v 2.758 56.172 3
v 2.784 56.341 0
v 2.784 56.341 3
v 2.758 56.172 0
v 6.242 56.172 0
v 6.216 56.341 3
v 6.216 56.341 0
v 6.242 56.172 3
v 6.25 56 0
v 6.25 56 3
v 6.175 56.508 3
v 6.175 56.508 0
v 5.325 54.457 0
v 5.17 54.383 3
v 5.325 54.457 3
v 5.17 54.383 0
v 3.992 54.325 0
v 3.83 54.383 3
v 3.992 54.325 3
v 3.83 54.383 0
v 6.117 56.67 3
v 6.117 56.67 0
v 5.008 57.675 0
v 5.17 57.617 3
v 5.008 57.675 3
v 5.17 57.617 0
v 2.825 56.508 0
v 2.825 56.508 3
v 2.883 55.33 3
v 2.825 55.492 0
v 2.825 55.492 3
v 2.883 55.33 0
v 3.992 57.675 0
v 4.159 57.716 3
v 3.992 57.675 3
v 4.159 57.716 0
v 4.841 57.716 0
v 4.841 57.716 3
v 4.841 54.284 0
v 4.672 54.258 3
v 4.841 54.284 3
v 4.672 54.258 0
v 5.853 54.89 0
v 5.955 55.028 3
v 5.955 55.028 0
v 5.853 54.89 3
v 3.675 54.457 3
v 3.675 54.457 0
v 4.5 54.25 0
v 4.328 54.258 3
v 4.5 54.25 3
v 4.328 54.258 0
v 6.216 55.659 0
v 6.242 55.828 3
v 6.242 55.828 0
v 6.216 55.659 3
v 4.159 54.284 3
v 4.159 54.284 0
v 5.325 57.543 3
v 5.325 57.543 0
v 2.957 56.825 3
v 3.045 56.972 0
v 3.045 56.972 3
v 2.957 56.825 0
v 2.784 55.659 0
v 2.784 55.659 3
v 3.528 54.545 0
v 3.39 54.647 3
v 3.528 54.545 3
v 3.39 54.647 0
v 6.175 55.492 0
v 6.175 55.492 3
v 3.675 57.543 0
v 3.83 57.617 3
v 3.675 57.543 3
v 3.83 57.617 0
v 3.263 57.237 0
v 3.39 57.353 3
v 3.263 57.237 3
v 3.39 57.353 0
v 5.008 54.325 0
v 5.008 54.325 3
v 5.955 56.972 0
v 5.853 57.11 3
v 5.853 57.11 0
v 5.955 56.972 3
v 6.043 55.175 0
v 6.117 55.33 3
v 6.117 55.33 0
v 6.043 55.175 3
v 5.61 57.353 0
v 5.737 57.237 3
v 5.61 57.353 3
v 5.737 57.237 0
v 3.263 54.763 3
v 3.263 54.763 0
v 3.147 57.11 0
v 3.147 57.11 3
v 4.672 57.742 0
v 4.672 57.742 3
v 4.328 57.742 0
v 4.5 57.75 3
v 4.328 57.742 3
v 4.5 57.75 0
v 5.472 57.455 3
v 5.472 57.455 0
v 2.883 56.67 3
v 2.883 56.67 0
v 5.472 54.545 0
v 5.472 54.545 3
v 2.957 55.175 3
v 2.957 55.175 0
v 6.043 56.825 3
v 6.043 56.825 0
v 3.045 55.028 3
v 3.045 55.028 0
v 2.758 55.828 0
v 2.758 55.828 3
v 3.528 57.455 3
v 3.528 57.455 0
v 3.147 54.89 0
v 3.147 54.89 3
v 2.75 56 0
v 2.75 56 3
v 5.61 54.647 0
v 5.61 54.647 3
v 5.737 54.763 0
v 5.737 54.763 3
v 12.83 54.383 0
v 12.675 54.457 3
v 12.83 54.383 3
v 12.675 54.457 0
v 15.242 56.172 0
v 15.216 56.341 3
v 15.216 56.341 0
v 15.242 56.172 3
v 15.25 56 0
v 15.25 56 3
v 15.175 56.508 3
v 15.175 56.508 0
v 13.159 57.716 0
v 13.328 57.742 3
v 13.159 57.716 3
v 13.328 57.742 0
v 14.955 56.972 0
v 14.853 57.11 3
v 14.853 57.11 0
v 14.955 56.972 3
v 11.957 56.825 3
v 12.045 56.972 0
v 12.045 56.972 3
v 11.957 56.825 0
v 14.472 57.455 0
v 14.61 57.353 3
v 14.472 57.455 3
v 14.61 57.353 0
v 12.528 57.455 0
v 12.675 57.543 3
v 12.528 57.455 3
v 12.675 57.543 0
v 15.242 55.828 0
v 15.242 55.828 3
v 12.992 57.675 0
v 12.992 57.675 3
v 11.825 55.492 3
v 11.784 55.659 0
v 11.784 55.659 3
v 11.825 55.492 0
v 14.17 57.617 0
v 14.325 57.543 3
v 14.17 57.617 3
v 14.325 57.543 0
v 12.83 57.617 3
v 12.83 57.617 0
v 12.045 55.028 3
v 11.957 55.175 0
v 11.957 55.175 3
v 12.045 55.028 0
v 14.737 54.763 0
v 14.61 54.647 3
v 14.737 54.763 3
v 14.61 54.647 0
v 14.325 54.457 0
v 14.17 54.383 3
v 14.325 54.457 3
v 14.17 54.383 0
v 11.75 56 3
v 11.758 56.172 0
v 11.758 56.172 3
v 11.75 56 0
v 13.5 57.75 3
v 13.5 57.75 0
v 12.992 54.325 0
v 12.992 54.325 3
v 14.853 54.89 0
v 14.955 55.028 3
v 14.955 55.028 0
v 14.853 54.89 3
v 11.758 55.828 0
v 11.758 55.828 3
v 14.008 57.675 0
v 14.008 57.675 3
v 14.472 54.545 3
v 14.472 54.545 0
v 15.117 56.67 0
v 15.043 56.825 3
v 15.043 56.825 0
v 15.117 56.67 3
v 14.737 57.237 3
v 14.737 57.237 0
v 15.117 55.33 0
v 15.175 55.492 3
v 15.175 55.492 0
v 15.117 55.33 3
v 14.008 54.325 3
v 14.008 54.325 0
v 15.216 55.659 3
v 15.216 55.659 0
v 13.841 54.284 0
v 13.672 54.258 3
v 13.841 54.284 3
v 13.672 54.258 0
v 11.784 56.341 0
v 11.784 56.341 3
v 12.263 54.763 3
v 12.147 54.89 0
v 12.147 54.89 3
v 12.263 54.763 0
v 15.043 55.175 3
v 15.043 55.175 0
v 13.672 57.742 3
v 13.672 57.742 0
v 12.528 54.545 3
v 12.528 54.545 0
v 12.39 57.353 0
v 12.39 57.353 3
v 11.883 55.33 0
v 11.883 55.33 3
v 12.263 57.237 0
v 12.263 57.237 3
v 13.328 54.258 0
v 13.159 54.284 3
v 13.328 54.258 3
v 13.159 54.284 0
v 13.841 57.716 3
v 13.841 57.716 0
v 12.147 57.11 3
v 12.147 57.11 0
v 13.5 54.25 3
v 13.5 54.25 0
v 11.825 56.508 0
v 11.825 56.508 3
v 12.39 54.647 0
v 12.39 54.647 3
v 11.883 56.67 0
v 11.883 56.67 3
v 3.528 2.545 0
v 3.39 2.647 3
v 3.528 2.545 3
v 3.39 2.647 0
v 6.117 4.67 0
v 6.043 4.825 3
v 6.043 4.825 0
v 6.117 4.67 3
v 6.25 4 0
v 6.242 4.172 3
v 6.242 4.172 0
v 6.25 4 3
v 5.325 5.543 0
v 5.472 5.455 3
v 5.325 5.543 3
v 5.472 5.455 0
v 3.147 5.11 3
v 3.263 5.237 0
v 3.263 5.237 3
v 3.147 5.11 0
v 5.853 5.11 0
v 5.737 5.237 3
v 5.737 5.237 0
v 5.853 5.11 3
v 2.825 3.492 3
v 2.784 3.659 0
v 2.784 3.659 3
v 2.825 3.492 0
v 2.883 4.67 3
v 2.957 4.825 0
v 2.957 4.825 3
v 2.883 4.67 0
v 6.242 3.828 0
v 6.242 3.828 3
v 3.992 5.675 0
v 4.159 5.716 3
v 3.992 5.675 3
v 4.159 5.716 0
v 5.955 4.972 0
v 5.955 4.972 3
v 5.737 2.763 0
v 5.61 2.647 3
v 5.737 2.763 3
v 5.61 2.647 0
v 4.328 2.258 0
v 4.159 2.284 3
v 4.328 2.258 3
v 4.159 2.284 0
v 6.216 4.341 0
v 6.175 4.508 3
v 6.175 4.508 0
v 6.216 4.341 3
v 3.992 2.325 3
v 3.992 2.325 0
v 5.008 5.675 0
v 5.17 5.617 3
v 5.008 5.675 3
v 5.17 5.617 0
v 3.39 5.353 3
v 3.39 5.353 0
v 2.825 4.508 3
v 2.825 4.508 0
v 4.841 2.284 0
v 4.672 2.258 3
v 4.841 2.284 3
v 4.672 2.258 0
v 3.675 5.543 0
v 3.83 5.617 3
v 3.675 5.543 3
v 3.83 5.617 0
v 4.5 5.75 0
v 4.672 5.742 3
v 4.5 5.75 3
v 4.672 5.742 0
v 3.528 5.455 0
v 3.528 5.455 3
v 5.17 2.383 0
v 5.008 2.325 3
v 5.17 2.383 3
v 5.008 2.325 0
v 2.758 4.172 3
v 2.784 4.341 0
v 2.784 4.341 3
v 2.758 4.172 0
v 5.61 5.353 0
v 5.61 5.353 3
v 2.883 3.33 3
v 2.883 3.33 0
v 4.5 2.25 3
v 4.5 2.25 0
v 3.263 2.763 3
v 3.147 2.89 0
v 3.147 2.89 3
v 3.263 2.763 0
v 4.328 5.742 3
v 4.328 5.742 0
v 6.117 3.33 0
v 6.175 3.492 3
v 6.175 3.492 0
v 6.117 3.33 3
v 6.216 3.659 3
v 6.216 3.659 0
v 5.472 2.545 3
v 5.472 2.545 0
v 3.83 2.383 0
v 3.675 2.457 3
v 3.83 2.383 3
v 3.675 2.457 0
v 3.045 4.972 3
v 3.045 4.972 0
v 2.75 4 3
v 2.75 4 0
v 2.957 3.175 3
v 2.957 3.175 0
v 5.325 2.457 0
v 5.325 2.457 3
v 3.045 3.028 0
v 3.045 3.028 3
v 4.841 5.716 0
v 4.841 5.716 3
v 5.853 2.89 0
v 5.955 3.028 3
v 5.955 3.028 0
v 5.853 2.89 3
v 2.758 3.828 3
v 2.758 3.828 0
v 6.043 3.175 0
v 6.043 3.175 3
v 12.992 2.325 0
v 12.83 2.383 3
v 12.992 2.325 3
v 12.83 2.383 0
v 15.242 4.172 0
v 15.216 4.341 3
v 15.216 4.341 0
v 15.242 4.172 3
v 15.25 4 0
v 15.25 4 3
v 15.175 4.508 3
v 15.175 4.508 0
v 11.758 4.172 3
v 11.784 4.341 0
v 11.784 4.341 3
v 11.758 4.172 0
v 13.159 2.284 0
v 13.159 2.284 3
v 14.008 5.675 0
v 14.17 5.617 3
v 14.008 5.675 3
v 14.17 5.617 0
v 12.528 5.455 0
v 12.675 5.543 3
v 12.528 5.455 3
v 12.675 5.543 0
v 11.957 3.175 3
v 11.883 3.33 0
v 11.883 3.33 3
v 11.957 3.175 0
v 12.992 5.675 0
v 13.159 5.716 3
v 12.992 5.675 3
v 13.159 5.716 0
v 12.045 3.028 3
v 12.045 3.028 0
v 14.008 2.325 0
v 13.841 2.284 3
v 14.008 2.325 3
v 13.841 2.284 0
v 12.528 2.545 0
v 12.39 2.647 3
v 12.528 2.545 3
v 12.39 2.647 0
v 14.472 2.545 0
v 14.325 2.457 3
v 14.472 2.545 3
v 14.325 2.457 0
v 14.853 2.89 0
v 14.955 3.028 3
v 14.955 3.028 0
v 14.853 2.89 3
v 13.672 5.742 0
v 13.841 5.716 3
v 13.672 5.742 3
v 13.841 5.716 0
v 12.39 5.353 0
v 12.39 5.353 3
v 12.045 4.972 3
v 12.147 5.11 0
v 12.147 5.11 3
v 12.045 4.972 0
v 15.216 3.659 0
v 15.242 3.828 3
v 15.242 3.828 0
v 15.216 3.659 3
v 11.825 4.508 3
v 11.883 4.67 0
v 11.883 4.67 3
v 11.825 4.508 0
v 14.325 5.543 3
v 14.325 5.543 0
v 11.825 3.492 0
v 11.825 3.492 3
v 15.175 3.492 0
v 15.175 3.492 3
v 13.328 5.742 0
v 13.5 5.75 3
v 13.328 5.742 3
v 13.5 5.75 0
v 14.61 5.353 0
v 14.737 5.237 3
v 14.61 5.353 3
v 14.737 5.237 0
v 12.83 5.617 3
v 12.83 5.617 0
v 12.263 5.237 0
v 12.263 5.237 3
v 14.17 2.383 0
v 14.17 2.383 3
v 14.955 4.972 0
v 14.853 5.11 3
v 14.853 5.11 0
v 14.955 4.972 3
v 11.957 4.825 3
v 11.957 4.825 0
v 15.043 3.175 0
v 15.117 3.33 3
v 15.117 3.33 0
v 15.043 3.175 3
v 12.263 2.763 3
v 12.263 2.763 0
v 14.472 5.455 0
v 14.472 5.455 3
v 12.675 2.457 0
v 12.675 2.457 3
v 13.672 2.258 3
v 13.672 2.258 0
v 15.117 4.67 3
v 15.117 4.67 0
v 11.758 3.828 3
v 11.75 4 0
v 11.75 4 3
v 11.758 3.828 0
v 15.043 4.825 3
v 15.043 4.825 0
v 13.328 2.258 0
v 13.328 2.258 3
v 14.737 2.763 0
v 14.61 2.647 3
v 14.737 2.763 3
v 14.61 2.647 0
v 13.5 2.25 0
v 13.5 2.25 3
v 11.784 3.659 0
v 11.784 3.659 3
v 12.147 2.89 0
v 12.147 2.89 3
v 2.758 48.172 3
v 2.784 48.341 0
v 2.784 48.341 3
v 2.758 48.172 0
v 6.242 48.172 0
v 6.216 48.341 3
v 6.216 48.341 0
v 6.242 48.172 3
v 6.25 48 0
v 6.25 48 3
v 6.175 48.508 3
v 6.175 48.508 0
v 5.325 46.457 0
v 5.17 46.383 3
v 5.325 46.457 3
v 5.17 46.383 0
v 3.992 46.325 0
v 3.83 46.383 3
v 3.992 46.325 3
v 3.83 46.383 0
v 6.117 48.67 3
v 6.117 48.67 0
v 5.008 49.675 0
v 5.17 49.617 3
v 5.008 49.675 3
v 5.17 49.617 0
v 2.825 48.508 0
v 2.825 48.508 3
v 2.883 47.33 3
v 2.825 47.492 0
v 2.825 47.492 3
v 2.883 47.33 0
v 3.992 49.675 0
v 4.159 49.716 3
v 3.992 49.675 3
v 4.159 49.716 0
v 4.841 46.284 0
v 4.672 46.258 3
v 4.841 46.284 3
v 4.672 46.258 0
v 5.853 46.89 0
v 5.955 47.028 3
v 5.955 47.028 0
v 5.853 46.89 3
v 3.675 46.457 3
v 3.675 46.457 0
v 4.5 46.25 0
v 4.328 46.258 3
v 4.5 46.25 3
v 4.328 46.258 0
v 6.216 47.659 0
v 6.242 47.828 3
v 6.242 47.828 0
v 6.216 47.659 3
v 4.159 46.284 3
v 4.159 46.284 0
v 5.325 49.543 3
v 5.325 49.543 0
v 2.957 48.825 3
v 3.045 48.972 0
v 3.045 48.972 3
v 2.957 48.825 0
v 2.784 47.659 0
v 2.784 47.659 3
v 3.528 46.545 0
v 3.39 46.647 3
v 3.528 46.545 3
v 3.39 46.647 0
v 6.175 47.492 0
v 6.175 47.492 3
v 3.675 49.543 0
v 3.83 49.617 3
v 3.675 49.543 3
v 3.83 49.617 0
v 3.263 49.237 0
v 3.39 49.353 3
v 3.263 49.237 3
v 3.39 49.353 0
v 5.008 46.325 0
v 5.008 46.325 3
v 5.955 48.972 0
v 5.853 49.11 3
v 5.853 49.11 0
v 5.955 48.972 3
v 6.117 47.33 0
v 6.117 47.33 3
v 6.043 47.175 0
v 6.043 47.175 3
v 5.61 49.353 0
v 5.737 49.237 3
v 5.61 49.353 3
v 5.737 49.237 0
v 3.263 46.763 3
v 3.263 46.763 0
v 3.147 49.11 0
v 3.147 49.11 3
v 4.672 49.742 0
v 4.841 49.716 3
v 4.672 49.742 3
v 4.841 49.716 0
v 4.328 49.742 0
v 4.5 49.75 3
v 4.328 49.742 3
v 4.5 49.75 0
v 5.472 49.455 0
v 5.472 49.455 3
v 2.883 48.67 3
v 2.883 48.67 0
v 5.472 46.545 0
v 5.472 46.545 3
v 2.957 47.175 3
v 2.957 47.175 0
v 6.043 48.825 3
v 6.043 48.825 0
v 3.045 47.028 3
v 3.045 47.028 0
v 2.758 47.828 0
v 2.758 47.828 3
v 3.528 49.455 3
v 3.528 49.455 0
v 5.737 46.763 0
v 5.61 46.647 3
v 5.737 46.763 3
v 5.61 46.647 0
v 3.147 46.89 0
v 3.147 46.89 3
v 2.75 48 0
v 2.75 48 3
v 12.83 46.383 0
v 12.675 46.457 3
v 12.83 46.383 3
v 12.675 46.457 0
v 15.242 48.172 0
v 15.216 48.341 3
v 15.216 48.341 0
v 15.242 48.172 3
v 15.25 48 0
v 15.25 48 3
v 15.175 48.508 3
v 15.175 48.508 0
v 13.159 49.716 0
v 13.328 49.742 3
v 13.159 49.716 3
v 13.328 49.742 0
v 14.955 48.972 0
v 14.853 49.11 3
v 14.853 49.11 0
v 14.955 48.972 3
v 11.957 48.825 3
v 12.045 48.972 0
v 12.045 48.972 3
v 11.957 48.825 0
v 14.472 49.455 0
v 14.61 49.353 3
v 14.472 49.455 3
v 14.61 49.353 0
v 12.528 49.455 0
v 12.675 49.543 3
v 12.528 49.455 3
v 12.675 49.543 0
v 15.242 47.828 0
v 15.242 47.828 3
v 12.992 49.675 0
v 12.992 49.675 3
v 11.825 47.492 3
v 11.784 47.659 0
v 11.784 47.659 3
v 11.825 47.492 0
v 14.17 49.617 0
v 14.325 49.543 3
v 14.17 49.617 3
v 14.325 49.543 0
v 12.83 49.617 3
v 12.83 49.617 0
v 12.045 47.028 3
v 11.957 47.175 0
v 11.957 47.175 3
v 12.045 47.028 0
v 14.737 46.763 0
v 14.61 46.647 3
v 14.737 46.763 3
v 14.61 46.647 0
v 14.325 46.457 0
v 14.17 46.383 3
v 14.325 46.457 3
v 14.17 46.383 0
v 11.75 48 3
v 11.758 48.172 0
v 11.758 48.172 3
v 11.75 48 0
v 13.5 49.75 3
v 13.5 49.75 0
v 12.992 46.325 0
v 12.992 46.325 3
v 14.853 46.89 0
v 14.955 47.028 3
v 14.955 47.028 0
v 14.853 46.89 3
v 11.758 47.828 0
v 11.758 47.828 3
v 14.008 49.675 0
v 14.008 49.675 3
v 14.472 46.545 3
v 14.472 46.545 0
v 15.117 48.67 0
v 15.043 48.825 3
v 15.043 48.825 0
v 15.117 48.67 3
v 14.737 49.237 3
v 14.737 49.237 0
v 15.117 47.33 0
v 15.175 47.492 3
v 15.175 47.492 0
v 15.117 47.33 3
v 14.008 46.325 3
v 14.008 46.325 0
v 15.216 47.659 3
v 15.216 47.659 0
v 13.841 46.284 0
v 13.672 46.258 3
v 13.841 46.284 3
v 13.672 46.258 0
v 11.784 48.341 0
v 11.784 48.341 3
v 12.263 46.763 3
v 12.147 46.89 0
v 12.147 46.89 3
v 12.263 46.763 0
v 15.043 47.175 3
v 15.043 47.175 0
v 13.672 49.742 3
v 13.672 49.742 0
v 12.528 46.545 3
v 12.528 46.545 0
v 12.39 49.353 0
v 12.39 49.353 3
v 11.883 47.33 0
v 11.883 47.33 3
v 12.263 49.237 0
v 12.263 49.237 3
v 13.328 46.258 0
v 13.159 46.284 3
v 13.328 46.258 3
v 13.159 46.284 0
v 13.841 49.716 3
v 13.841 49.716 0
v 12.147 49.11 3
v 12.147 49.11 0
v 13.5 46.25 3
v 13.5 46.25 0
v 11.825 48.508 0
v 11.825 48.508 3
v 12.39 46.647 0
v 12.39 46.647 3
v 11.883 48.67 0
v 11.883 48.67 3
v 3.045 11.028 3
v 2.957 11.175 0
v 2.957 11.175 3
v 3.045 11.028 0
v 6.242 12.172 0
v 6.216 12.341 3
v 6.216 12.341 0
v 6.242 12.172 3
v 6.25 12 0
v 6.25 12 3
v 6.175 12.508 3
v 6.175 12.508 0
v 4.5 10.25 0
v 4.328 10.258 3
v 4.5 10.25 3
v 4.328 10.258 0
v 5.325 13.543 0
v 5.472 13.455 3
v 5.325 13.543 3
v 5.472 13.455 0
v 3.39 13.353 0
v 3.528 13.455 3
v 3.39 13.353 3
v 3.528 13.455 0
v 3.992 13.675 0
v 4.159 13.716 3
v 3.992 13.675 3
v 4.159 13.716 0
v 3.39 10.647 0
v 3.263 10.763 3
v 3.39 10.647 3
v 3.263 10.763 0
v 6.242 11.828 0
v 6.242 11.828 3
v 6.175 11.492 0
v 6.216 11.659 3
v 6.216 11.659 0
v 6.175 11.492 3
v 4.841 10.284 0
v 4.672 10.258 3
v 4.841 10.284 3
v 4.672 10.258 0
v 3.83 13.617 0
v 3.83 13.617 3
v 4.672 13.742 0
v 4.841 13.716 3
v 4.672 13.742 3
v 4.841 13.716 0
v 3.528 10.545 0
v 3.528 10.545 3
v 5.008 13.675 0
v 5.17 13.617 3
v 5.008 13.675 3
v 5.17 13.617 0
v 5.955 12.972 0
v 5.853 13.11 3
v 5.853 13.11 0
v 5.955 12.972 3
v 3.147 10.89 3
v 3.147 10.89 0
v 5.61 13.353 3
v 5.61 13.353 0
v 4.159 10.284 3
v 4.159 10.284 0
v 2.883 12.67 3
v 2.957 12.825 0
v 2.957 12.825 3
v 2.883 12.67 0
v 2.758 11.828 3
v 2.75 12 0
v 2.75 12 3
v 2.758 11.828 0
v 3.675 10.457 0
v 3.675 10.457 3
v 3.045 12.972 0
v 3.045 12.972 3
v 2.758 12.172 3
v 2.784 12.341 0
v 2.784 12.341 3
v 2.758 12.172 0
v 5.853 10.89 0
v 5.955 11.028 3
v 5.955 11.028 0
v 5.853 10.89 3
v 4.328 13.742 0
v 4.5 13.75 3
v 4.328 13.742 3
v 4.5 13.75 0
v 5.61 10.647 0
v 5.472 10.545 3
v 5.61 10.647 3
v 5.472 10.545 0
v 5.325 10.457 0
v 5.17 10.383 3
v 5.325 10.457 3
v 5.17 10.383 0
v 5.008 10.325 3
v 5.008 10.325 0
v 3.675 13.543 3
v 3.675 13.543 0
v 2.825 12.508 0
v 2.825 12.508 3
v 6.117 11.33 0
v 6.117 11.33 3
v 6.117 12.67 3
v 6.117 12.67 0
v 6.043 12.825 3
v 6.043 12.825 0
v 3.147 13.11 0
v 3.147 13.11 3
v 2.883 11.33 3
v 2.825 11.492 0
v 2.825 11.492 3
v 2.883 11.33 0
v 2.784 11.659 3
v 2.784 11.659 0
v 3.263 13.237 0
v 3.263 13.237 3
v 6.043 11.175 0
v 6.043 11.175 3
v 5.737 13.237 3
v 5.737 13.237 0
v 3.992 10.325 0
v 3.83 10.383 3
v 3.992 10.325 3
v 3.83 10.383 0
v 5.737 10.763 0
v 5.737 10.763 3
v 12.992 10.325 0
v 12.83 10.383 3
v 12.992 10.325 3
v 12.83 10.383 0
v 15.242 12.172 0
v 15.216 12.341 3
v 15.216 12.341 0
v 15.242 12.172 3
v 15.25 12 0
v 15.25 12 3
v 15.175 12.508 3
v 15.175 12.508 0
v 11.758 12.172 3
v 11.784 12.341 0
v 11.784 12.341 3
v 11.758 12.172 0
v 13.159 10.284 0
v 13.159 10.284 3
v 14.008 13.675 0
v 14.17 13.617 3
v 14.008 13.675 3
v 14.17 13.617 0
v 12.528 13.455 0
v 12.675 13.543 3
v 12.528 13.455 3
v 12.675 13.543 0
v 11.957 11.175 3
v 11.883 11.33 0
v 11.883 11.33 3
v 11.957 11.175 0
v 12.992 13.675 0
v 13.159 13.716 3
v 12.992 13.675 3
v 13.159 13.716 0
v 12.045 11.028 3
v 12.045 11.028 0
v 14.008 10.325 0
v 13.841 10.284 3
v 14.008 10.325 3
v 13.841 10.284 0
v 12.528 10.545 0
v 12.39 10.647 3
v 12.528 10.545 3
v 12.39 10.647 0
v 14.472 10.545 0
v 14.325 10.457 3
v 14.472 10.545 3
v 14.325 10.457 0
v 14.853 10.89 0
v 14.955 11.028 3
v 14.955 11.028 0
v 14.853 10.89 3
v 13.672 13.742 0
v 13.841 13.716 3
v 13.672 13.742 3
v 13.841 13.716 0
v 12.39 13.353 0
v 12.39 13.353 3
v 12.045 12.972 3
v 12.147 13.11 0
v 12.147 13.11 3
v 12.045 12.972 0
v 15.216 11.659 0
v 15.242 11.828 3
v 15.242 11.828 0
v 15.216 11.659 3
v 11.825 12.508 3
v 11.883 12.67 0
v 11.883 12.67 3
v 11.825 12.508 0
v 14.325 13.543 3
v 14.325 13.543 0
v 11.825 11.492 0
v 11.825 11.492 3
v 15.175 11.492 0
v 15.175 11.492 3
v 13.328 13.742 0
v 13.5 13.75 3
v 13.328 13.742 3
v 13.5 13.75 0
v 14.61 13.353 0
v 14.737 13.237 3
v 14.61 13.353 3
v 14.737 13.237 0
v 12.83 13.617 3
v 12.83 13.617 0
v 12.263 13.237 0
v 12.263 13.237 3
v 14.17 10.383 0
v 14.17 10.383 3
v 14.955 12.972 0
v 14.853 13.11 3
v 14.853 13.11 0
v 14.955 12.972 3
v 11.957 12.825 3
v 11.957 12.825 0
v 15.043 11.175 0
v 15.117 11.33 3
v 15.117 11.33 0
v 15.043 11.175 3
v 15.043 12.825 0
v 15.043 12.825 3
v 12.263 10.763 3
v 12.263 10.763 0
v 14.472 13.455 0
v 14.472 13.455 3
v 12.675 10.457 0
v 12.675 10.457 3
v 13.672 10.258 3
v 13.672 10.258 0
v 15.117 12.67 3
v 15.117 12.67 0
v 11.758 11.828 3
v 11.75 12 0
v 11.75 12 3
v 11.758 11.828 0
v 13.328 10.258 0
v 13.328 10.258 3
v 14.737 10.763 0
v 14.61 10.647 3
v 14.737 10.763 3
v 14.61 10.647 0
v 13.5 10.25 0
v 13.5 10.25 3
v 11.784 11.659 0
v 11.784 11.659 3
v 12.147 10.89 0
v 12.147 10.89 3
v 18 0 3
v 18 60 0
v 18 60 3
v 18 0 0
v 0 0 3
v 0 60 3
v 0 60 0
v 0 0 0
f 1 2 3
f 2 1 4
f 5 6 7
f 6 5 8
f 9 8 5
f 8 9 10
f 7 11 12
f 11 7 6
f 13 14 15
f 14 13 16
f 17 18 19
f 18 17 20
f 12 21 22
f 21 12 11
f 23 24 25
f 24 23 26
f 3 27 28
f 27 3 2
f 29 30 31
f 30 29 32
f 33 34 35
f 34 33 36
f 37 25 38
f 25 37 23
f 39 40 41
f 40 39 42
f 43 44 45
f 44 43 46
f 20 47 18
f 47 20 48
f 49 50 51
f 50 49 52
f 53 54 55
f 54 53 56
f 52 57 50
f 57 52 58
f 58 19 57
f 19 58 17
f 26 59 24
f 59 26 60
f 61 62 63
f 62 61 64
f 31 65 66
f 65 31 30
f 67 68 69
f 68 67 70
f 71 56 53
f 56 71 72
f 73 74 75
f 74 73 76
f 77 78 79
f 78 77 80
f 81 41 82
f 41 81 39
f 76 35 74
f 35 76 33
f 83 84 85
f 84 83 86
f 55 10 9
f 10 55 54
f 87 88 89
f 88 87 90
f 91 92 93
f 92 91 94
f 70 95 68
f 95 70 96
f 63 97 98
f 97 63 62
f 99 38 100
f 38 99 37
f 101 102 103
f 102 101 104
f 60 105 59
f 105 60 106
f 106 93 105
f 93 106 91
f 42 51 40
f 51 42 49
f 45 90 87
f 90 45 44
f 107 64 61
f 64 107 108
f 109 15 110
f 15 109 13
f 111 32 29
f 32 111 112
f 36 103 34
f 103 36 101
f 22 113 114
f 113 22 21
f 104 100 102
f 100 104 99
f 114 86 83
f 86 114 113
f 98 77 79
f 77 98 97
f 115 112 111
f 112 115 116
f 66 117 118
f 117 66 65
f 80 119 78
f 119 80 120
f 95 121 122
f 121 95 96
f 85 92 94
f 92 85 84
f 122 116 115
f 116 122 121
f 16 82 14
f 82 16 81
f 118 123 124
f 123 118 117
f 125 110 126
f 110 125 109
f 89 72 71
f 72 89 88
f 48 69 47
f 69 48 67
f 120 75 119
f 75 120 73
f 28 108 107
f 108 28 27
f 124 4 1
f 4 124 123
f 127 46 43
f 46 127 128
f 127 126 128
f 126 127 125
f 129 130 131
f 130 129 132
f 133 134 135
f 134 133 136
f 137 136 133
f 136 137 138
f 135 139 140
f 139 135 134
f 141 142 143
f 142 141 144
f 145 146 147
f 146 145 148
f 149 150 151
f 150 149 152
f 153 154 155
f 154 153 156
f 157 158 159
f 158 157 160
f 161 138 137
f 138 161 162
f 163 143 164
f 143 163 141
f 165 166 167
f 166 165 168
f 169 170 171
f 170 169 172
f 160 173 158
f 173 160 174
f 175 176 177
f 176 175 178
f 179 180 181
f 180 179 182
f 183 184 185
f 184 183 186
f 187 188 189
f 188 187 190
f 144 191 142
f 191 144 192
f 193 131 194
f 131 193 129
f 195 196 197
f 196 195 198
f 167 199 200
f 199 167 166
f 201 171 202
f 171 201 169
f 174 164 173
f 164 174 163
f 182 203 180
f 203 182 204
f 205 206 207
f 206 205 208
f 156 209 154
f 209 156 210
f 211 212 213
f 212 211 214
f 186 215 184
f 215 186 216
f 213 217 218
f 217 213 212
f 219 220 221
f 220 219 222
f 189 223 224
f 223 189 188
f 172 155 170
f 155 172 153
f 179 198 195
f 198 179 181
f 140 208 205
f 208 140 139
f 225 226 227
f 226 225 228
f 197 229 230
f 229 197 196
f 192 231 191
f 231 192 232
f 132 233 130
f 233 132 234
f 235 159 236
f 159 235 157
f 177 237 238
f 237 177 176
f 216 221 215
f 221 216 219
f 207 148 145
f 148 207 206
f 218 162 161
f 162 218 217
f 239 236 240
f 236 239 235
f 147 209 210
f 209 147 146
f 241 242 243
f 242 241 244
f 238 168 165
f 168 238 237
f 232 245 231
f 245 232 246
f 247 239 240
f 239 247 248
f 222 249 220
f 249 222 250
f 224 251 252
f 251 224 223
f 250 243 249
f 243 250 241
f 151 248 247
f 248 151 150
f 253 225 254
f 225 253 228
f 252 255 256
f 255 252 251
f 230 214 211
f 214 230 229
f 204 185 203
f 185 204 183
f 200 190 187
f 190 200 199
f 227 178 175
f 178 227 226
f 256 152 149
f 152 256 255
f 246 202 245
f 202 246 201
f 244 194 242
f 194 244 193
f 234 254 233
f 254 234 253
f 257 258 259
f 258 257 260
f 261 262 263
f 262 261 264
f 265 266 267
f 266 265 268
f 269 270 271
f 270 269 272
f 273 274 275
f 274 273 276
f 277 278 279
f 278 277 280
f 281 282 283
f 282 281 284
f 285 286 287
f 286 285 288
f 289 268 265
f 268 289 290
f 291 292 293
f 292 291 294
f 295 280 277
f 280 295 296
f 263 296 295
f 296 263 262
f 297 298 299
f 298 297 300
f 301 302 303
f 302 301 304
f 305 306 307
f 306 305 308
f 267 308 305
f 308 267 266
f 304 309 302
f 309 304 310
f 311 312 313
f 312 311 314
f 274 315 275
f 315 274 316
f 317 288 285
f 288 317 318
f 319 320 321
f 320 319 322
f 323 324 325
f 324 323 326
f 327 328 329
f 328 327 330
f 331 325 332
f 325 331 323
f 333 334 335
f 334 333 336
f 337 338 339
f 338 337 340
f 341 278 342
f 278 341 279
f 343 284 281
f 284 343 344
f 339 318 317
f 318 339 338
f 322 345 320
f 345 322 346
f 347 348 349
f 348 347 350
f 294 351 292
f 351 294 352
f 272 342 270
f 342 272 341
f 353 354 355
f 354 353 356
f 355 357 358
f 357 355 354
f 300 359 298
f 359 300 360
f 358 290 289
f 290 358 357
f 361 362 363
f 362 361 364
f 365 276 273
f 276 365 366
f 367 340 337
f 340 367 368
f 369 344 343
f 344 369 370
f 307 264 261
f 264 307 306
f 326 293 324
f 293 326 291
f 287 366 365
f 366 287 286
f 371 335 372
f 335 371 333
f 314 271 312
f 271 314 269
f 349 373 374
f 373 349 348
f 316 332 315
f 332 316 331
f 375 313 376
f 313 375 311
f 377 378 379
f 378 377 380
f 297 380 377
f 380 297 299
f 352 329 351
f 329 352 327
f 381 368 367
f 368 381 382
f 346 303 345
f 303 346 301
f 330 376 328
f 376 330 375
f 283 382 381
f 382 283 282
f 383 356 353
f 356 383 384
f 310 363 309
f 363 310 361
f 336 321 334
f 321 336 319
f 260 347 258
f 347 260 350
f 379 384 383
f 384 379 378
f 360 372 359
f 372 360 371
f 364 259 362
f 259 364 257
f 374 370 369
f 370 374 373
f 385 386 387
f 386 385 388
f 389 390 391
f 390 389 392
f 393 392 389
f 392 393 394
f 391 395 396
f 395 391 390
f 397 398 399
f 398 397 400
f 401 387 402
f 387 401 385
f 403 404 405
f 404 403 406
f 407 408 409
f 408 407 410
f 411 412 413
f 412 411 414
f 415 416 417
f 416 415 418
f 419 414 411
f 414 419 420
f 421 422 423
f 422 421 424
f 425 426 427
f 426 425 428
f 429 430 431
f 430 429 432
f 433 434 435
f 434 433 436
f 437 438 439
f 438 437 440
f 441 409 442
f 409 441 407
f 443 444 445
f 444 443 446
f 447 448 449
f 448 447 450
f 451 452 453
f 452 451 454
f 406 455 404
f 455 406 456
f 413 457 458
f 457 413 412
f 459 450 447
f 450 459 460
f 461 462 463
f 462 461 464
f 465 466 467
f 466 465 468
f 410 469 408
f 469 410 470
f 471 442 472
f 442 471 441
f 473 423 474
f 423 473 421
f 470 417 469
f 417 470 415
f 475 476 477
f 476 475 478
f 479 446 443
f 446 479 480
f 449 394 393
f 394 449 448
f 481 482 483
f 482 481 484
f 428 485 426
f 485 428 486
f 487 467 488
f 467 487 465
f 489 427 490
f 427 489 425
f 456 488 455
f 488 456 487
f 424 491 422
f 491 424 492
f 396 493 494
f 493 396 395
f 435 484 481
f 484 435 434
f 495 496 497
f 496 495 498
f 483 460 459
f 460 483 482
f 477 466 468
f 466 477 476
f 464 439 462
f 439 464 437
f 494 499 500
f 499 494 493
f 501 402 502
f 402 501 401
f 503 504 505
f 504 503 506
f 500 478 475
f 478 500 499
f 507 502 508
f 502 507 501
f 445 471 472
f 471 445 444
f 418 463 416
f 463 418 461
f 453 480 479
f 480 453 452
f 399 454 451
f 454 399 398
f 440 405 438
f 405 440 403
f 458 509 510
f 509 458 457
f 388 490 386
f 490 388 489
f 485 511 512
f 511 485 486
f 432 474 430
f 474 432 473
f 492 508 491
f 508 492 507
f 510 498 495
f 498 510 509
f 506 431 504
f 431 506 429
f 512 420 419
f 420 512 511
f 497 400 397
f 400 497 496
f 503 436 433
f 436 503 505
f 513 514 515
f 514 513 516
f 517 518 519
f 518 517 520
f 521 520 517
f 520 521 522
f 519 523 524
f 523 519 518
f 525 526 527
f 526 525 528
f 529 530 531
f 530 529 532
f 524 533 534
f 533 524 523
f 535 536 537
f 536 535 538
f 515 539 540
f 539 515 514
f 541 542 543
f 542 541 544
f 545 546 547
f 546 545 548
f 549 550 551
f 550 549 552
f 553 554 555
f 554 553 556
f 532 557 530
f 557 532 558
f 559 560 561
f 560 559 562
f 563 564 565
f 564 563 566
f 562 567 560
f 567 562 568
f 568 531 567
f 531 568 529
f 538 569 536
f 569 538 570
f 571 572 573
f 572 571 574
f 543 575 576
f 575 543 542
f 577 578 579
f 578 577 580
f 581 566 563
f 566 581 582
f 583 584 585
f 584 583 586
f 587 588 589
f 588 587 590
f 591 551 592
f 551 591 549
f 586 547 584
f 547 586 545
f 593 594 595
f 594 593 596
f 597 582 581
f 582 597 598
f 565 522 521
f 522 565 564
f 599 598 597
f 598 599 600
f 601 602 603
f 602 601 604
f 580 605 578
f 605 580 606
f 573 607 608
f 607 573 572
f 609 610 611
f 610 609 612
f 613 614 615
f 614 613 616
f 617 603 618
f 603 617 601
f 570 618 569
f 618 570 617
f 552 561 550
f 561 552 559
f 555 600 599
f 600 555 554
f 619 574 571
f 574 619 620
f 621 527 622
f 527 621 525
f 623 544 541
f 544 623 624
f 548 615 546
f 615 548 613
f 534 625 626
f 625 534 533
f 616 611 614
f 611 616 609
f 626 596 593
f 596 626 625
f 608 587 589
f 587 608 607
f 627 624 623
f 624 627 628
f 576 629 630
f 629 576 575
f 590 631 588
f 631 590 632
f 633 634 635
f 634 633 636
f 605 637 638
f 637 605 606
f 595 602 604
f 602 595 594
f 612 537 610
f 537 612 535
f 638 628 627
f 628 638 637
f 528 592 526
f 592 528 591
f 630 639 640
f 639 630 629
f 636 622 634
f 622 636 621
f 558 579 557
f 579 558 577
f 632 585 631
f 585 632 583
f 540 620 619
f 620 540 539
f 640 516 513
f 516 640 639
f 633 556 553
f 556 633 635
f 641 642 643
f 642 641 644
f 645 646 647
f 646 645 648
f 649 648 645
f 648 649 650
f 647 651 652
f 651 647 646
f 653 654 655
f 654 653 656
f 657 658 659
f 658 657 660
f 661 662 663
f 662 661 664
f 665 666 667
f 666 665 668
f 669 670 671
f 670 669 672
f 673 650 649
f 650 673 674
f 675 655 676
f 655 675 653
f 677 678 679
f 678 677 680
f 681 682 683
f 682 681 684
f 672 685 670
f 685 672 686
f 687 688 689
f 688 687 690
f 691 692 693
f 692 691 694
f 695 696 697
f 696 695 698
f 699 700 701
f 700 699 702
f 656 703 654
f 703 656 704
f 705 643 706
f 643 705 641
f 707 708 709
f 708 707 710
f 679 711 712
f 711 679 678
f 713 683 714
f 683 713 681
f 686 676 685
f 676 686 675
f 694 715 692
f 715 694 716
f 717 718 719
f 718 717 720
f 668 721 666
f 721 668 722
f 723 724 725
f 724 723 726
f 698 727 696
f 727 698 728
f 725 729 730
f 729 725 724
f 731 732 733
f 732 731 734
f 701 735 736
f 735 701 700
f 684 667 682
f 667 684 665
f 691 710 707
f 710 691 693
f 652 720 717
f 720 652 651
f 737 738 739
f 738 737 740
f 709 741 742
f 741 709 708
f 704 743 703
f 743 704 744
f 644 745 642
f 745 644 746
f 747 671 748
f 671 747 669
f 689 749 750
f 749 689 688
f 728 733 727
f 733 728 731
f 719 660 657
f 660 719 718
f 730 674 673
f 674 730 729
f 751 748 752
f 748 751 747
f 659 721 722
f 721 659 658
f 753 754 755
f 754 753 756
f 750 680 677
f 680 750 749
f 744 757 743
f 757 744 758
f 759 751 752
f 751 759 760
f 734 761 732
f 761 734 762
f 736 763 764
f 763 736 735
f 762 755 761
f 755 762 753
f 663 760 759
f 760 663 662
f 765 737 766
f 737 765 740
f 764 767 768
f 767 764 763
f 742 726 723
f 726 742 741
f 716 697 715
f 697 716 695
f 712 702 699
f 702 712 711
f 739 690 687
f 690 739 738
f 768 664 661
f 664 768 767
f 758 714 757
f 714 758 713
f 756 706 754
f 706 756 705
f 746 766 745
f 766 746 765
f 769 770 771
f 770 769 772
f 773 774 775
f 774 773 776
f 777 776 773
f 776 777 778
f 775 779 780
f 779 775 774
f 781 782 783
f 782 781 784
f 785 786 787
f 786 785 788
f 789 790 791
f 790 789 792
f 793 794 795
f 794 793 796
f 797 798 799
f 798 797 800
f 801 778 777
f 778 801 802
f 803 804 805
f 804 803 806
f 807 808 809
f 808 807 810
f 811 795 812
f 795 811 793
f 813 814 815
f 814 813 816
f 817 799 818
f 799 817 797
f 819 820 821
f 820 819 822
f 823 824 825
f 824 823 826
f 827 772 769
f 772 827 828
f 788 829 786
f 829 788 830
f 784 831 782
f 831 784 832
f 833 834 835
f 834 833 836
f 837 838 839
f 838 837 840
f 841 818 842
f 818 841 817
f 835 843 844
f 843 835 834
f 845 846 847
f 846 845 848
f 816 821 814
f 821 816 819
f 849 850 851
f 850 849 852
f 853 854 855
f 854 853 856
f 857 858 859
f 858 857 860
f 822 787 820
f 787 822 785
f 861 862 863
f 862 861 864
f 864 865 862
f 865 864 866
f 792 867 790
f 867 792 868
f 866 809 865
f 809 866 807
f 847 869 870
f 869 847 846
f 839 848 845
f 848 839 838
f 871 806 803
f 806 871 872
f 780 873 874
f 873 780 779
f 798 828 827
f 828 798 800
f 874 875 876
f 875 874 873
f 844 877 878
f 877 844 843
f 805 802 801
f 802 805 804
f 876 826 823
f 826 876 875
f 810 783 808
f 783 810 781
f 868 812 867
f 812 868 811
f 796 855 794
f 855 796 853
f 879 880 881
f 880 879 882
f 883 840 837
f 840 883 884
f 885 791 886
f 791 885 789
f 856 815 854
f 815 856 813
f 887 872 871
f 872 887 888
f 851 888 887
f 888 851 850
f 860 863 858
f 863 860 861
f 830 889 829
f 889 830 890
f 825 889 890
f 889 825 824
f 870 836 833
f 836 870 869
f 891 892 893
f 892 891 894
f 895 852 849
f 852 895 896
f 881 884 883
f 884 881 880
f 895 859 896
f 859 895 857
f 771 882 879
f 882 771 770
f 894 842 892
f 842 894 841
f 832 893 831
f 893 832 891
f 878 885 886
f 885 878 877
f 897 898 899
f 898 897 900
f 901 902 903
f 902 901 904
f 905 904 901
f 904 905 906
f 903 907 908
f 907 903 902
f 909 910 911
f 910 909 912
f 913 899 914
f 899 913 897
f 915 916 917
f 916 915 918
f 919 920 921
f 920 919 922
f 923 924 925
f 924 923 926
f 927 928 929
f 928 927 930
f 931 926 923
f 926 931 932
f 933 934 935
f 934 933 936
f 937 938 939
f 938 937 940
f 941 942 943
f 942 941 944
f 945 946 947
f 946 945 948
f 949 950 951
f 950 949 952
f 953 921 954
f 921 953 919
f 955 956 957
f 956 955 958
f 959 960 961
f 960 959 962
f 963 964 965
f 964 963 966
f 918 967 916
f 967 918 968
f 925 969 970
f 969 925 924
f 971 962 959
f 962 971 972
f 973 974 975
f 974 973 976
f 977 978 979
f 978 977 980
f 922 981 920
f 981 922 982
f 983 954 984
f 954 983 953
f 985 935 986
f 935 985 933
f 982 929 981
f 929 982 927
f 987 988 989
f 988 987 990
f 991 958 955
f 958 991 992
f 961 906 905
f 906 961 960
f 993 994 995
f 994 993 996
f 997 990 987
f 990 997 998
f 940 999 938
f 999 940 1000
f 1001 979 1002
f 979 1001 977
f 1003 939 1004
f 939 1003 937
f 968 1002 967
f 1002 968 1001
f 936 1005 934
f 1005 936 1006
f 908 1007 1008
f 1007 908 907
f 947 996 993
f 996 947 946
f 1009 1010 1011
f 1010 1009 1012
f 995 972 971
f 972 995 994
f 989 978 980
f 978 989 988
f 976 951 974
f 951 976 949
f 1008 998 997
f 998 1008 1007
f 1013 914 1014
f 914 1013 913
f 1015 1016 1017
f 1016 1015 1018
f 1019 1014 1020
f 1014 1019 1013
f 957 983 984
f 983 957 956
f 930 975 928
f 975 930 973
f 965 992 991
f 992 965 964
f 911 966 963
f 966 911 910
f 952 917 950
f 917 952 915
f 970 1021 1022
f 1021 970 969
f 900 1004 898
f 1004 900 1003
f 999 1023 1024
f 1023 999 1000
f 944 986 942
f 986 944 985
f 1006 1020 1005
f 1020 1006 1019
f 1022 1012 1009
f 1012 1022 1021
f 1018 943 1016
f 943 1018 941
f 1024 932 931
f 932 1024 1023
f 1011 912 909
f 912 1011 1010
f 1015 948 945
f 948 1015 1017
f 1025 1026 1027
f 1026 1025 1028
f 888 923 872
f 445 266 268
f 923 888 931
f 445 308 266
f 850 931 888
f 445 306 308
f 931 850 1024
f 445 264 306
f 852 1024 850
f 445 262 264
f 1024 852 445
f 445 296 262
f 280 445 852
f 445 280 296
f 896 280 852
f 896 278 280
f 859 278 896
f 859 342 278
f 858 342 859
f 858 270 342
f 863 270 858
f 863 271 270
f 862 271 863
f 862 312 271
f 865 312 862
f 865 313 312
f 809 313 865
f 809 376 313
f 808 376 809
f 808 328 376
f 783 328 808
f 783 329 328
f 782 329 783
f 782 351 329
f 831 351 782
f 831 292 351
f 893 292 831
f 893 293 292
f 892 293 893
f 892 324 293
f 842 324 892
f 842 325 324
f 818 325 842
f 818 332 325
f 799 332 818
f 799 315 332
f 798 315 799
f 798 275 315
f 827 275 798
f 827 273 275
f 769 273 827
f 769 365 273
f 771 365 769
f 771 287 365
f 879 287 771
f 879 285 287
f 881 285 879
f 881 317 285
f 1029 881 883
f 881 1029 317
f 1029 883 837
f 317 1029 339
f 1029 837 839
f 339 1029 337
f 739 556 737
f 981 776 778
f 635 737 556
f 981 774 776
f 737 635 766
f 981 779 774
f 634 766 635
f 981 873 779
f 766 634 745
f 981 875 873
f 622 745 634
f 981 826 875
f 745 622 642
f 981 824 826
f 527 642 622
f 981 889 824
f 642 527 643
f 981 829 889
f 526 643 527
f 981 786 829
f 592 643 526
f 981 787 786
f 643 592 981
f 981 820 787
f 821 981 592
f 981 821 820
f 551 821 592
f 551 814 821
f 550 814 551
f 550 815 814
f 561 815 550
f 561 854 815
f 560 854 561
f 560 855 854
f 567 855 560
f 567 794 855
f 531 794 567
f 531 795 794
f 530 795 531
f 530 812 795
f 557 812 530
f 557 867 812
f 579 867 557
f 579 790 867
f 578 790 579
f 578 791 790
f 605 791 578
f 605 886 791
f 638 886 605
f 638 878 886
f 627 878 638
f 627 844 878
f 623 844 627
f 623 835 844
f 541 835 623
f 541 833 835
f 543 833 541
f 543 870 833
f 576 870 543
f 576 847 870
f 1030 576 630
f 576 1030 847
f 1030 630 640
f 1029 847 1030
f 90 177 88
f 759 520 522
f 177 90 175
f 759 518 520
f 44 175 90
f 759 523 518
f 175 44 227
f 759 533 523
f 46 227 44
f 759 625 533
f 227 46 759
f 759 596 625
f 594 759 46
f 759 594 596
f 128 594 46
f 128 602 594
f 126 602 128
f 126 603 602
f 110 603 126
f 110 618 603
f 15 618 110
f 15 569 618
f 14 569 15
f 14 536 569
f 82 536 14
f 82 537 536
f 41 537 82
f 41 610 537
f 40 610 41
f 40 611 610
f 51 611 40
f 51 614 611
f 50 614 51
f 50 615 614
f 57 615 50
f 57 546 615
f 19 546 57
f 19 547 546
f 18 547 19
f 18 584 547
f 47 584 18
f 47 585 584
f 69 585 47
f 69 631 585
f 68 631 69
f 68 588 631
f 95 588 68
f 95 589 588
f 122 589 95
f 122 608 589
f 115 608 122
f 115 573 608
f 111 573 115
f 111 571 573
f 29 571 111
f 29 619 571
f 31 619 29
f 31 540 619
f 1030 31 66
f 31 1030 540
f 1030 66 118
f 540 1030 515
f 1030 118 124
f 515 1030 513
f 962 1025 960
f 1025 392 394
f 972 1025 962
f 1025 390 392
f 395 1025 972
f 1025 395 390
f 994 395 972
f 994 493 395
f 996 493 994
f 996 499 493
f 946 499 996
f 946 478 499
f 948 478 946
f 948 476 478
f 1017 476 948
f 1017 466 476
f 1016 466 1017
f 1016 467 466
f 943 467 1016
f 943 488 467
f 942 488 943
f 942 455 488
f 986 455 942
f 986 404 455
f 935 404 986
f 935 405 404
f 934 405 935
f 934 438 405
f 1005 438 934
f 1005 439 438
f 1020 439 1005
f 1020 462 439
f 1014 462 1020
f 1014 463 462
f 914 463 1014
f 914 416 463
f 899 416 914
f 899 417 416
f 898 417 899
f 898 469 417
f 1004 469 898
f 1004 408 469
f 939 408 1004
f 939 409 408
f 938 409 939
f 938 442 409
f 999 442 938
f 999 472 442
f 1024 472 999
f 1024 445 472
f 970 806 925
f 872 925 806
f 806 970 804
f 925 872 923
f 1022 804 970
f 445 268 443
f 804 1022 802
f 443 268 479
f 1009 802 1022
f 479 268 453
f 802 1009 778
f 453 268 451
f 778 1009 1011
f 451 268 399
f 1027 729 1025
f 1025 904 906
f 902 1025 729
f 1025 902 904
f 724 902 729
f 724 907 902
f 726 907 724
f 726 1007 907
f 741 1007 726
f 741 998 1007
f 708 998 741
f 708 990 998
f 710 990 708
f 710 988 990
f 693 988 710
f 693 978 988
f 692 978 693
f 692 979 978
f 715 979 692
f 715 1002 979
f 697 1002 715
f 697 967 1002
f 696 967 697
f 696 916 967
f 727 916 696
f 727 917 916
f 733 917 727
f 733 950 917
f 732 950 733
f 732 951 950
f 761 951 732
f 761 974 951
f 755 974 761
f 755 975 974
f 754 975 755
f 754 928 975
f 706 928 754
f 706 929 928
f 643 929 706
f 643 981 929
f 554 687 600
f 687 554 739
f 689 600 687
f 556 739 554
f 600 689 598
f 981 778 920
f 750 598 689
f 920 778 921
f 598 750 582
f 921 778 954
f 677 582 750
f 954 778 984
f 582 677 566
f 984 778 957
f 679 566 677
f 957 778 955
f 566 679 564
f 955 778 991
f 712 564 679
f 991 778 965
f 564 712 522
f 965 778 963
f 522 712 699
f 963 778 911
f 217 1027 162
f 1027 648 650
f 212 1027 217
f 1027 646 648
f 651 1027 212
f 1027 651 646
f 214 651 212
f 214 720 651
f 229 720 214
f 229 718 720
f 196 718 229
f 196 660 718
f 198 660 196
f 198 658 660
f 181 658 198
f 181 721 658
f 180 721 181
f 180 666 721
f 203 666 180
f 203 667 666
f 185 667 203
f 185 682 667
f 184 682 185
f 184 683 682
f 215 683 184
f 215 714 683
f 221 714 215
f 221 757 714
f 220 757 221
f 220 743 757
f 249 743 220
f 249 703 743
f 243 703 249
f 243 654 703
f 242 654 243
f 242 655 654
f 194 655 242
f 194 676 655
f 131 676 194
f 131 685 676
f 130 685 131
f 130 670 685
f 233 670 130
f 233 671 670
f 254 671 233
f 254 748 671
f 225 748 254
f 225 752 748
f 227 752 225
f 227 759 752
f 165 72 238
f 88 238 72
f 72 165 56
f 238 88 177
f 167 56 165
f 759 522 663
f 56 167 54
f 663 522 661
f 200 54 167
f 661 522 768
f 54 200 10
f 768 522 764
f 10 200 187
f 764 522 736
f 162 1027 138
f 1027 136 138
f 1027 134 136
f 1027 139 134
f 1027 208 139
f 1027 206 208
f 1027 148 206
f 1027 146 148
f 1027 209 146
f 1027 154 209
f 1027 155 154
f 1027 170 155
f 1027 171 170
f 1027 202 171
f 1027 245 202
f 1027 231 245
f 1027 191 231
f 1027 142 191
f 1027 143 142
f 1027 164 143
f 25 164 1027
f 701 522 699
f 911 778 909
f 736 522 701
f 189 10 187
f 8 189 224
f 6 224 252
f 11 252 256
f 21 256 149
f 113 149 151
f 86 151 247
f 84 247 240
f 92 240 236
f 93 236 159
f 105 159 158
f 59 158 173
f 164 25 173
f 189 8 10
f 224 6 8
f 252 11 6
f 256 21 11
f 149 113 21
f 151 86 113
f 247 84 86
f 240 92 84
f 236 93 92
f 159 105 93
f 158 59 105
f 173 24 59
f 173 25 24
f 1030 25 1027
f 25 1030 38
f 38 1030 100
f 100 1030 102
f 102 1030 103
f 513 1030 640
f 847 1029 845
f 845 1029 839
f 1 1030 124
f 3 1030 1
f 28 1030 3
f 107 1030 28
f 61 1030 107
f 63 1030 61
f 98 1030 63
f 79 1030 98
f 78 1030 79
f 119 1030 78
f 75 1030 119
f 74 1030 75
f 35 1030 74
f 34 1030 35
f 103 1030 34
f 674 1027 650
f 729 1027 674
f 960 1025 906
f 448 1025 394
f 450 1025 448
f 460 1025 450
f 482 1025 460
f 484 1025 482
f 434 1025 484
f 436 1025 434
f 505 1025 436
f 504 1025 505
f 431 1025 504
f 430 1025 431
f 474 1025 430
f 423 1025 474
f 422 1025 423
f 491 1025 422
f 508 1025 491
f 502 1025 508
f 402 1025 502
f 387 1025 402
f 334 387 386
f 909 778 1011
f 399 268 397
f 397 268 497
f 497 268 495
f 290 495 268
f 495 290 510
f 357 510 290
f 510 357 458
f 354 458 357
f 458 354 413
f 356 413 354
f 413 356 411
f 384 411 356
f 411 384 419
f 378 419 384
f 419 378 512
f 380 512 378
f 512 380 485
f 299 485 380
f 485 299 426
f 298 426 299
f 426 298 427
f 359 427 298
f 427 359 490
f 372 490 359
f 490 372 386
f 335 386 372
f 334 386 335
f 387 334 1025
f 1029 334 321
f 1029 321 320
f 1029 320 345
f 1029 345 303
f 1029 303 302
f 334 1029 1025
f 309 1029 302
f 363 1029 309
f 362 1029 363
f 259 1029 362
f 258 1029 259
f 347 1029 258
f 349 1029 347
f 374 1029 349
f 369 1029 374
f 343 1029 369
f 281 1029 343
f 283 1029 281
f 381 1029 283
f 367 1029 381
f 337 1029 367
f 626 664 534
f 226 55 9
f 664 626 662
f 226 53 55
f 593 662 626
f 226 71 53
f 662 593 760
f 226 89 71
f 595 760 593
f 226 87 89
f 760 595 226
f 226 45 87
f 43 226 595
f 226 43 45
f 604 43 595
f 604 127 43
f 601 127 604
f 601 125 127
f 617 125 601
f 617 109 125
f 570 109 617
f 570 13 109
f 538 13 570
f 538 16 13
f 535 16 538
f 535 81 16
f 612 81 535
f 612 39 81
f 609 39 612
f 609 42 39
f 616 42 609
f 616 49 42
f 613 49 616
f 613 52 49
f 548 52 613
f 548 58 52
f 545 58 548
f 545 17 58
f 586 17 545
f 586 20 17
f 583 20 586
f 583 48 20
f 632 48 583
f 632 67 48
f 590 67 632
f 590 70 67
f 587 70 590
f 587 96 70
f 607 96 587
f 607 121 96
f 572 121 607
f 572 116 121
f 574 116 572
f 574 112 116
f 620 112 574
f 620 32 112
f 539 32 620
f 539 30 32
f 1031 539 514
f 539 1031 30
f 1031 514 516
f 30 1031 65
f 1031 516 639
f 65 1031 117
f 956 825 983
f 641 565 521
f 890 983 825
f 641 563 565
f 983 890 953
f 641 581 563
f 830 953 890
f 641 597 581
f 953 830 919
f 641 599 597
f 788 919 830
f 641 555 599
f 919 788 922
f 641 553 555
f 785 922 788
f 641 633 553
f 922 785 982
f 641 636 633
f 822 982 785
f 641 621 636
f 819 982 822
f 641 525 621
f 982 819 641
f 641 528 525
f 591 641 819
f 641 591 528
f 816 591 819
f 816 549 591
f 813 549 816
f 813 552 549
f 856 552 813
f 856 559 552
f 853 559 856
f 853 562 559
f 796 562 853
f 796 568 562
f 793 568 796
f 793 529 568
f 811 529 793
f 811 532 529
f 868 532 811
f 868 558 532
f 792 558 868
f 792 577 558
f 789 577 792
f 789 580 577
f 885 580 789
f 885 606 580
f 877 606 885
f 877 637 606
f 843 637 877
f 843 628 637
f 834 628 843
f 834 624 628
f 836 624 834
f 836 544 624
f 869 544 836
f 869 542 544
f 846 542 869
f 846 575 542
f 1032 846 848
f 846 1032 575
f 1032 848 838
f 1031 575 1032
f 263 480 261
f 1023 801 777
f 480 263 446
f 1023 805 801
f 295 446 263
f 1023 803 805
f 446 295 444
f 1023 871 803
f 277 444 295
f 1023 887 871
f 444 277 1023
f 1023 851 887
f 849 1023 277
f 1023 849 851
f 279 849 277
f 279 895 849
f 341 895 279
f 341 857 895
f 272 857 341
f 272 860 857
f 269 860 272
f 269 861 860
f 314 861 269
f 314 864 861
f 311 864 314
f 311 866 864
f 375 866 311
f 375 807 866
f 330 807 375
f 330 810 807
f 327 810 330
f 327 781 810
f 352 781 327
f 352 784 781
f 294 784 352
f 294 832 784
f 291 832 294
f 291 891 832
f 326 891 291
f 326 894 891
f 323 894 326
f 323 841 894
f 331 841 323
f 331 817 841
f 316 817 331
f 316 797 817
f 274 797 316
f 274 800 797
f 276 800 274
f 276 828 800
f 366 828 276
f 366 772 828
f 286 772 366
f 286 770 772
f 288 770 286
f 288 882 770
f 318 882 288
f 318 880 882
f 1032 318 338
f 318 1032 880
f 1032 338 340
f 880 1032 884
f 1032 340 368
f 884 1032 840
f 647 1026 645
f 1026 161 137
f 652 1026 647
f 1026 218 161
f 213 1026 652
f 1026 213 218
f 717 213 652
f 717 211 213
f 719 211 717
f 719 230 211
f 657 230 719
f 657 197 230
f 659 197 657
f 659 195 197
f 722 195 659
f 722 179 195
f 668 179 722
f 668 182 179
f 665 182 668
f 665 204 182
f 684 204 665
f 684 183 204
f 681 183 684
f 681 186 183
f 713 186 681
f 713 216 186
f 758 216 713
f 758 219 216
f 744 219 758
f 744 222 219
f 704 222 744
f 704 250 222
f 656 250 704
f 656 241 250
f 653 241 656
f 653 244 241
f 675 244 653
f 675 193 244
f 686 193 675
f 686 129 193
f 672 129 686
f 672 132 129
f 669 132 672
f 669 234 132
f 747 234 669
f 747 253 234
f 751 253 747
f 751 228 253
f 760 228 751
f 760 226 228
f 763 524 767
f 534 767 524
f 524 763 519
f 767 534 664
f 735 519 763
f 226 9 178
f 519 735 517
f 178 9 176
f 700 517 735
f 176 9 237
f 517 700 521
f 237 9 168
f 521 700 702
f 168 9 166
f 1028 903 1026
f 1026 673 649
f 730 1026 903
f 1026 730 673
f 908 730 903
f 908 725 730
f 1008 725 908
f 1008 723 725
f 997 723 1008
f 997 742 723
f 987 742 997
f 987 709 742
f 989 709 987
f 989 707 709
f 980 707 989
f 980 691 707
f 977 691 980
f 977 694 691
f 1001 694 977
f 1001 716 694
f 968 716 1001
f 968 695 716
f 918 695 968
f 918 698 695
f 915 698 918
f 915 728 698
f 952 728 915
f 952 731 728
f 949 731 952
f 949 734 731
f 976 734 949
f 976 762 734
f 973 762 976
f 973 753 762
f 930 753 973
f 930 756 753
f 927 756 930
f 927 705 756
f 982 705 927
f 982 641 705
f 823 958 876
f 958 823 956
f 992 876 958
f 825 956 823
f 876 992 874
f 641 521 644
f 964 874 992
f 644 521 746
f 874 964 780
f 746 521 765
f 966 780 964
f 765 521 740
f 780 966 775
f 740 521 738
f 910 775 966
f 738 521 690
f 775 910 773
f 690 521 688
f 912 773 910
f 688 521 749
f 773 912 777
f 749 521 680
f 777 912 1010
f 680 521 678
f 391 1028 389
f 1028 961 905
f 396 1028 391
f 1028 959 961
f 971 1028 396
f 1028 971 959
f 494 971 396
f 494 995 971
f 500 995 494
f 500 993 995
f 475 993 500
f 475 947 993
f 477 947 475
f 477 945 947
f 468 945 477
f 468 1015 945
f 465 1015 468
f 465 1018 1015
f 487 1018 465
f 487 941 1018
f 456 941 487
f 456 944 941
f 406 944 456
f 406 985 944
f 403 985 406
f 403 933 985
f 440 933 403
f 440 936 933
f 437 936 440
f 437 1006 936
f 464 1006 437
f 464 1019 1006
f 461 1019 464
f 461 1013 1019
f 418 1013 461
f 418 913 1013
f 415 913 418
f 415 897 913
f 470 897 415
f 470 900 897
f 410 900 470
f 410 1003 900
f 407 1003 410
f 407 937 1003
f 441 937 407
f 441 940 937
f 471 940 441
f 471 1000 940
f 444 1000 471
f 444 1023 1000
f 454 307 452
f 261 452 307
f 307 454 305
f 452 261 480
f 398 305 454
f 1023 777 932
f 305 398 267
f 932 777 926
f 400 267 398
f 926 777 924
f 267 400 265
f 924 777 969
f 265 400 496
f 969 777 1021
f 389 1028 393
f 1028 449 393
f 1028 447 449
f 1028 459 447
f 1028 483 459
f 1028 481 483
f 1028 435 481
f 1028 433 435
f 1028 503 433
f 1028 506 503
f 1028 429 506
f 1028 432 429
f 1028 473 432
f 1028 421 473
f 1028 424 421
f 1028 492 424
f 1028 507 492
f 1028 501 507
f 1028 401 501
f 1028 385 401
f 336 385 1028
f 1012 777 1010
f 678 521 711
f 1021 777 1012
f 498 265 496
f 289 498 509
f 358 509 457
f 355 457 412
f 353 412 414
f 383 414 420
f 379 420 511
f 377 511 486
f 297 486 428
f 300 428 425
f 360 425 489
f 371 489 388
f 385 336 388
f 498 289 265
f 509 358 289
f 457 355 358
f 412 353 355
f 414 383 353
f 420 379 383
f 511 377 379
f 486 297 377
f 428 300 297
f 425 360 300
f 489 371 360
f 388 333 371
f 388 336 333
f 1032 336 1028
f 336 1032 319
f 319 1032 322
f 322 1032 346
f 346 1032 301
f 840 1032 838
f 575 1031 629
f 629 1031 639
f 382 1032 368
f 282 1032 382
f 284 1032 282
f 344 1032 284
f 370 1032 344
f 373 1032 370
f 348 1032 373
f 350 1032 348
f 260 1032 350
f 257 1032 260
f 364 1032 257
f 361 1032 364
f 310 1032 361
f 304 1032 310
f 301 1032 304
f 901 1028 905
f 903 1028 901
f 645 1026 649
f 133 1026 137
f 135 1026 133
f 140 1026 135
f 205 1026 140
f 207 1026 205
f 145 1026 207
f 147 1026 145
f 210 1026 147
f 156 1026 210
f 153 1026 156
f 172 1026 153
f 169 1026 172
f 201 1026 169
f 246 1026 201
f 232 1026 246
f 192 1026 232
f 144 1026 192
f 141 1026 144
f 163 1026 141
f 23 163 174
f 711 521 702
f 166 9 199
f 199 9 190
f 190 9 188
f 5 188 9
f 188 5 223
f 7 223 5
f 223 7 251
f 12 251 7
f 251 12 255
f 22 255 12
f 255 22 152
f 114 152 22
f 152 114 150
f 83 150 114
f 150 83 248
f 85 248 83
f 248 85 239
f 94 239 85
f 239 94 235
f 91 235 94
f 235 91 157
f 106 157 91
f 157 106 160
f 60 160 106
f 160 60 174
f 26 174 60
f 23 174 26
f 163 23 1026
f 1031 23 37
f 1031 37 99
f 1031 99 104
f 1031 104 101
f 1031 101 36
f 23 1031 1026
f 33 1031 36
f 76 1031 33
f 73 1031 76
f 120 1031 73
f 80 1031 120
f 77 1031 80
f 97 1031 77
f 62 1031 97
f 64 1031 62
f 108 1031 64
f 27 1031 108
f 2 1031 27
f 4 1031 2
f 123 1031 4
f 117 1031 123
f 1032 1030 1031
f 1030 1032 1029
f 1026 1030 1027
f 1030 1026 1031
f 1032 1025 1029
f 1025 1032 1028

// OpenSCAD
/**
 * bodyPieceC
 * @name bodyPieceC
 * @description Piece to join left and right legs
 * @type piece
 * @parent bodyComponent
 */
module bodyPieceC(
    length = 60,
    width = 18
) {
    thickness = 3;
    hole_diameter = 6;

    screw_hole_diameter = 3.5;

    difference() {
        cube([width, length, thickness], center = false);

        translate([width / 2, length, 0]) {
            // Screw holes
            translate([-4.5,  -4, 0])
                cylinder(h = thickness * 5, r = screw_hole_diameter / 2, center = true, $fn = 64);

            translate([4.5, -4, 0])
                cylinder(h = thickness * 5, r = screw_hole_diameter / 2, center = true, $fn = 64);
        }

        translate([width / 2, 0, 0]) {
            // Screw holes
            translate([-4.5,  4, 0])
                cylinder(h = thickness * 5, r = screw_hole_diameter / 2, center = true, $fn = 64);

            translate([4.5, 4, 0])
                cylinder(h = thickness * 5, r = screw_hole_diameter / 2, center = true, $fn = 64);
        }


        // interblock fixation holes
        length_offset_interblock_fixation_holes = 12;

        translate([width / 2, length, 0]) {
            // Screw holes
            translate([-4.5,  -length_offset_interblock_fixation_holes, 0])
                cylinder(h = thickness * 5, r = screw_hole_diameter / 2, center = true, $fn = 64);

            translate([4.5, -length_offset_interblock_fixation_holes, 0])
                cylinder(h = thickness * 5, r = screw_hole_diameter / 2, center = true, $fn = 64);
        }

        translate([width / 2, 0, 0]) {
            // Screw holes
            translate([-4.5,  length_offset_interblock_fixation_holes, 0])
                cylinder(h = thickness * 5, r = screw_hole_diameter / 2, center = true, $fn = 64);

            translate([4.5, length_offset_interblock_fixation_holes, 0])
                cylinder(h = thickness * 5, r = screw_hole_diameter / 2, center = true, $fn = 64);
        }

    }
}


/**
 * @stl
 * @png
 * @colorscheme BeforeDawn
 * @view axes,scales
 */
bodyPieceC();
